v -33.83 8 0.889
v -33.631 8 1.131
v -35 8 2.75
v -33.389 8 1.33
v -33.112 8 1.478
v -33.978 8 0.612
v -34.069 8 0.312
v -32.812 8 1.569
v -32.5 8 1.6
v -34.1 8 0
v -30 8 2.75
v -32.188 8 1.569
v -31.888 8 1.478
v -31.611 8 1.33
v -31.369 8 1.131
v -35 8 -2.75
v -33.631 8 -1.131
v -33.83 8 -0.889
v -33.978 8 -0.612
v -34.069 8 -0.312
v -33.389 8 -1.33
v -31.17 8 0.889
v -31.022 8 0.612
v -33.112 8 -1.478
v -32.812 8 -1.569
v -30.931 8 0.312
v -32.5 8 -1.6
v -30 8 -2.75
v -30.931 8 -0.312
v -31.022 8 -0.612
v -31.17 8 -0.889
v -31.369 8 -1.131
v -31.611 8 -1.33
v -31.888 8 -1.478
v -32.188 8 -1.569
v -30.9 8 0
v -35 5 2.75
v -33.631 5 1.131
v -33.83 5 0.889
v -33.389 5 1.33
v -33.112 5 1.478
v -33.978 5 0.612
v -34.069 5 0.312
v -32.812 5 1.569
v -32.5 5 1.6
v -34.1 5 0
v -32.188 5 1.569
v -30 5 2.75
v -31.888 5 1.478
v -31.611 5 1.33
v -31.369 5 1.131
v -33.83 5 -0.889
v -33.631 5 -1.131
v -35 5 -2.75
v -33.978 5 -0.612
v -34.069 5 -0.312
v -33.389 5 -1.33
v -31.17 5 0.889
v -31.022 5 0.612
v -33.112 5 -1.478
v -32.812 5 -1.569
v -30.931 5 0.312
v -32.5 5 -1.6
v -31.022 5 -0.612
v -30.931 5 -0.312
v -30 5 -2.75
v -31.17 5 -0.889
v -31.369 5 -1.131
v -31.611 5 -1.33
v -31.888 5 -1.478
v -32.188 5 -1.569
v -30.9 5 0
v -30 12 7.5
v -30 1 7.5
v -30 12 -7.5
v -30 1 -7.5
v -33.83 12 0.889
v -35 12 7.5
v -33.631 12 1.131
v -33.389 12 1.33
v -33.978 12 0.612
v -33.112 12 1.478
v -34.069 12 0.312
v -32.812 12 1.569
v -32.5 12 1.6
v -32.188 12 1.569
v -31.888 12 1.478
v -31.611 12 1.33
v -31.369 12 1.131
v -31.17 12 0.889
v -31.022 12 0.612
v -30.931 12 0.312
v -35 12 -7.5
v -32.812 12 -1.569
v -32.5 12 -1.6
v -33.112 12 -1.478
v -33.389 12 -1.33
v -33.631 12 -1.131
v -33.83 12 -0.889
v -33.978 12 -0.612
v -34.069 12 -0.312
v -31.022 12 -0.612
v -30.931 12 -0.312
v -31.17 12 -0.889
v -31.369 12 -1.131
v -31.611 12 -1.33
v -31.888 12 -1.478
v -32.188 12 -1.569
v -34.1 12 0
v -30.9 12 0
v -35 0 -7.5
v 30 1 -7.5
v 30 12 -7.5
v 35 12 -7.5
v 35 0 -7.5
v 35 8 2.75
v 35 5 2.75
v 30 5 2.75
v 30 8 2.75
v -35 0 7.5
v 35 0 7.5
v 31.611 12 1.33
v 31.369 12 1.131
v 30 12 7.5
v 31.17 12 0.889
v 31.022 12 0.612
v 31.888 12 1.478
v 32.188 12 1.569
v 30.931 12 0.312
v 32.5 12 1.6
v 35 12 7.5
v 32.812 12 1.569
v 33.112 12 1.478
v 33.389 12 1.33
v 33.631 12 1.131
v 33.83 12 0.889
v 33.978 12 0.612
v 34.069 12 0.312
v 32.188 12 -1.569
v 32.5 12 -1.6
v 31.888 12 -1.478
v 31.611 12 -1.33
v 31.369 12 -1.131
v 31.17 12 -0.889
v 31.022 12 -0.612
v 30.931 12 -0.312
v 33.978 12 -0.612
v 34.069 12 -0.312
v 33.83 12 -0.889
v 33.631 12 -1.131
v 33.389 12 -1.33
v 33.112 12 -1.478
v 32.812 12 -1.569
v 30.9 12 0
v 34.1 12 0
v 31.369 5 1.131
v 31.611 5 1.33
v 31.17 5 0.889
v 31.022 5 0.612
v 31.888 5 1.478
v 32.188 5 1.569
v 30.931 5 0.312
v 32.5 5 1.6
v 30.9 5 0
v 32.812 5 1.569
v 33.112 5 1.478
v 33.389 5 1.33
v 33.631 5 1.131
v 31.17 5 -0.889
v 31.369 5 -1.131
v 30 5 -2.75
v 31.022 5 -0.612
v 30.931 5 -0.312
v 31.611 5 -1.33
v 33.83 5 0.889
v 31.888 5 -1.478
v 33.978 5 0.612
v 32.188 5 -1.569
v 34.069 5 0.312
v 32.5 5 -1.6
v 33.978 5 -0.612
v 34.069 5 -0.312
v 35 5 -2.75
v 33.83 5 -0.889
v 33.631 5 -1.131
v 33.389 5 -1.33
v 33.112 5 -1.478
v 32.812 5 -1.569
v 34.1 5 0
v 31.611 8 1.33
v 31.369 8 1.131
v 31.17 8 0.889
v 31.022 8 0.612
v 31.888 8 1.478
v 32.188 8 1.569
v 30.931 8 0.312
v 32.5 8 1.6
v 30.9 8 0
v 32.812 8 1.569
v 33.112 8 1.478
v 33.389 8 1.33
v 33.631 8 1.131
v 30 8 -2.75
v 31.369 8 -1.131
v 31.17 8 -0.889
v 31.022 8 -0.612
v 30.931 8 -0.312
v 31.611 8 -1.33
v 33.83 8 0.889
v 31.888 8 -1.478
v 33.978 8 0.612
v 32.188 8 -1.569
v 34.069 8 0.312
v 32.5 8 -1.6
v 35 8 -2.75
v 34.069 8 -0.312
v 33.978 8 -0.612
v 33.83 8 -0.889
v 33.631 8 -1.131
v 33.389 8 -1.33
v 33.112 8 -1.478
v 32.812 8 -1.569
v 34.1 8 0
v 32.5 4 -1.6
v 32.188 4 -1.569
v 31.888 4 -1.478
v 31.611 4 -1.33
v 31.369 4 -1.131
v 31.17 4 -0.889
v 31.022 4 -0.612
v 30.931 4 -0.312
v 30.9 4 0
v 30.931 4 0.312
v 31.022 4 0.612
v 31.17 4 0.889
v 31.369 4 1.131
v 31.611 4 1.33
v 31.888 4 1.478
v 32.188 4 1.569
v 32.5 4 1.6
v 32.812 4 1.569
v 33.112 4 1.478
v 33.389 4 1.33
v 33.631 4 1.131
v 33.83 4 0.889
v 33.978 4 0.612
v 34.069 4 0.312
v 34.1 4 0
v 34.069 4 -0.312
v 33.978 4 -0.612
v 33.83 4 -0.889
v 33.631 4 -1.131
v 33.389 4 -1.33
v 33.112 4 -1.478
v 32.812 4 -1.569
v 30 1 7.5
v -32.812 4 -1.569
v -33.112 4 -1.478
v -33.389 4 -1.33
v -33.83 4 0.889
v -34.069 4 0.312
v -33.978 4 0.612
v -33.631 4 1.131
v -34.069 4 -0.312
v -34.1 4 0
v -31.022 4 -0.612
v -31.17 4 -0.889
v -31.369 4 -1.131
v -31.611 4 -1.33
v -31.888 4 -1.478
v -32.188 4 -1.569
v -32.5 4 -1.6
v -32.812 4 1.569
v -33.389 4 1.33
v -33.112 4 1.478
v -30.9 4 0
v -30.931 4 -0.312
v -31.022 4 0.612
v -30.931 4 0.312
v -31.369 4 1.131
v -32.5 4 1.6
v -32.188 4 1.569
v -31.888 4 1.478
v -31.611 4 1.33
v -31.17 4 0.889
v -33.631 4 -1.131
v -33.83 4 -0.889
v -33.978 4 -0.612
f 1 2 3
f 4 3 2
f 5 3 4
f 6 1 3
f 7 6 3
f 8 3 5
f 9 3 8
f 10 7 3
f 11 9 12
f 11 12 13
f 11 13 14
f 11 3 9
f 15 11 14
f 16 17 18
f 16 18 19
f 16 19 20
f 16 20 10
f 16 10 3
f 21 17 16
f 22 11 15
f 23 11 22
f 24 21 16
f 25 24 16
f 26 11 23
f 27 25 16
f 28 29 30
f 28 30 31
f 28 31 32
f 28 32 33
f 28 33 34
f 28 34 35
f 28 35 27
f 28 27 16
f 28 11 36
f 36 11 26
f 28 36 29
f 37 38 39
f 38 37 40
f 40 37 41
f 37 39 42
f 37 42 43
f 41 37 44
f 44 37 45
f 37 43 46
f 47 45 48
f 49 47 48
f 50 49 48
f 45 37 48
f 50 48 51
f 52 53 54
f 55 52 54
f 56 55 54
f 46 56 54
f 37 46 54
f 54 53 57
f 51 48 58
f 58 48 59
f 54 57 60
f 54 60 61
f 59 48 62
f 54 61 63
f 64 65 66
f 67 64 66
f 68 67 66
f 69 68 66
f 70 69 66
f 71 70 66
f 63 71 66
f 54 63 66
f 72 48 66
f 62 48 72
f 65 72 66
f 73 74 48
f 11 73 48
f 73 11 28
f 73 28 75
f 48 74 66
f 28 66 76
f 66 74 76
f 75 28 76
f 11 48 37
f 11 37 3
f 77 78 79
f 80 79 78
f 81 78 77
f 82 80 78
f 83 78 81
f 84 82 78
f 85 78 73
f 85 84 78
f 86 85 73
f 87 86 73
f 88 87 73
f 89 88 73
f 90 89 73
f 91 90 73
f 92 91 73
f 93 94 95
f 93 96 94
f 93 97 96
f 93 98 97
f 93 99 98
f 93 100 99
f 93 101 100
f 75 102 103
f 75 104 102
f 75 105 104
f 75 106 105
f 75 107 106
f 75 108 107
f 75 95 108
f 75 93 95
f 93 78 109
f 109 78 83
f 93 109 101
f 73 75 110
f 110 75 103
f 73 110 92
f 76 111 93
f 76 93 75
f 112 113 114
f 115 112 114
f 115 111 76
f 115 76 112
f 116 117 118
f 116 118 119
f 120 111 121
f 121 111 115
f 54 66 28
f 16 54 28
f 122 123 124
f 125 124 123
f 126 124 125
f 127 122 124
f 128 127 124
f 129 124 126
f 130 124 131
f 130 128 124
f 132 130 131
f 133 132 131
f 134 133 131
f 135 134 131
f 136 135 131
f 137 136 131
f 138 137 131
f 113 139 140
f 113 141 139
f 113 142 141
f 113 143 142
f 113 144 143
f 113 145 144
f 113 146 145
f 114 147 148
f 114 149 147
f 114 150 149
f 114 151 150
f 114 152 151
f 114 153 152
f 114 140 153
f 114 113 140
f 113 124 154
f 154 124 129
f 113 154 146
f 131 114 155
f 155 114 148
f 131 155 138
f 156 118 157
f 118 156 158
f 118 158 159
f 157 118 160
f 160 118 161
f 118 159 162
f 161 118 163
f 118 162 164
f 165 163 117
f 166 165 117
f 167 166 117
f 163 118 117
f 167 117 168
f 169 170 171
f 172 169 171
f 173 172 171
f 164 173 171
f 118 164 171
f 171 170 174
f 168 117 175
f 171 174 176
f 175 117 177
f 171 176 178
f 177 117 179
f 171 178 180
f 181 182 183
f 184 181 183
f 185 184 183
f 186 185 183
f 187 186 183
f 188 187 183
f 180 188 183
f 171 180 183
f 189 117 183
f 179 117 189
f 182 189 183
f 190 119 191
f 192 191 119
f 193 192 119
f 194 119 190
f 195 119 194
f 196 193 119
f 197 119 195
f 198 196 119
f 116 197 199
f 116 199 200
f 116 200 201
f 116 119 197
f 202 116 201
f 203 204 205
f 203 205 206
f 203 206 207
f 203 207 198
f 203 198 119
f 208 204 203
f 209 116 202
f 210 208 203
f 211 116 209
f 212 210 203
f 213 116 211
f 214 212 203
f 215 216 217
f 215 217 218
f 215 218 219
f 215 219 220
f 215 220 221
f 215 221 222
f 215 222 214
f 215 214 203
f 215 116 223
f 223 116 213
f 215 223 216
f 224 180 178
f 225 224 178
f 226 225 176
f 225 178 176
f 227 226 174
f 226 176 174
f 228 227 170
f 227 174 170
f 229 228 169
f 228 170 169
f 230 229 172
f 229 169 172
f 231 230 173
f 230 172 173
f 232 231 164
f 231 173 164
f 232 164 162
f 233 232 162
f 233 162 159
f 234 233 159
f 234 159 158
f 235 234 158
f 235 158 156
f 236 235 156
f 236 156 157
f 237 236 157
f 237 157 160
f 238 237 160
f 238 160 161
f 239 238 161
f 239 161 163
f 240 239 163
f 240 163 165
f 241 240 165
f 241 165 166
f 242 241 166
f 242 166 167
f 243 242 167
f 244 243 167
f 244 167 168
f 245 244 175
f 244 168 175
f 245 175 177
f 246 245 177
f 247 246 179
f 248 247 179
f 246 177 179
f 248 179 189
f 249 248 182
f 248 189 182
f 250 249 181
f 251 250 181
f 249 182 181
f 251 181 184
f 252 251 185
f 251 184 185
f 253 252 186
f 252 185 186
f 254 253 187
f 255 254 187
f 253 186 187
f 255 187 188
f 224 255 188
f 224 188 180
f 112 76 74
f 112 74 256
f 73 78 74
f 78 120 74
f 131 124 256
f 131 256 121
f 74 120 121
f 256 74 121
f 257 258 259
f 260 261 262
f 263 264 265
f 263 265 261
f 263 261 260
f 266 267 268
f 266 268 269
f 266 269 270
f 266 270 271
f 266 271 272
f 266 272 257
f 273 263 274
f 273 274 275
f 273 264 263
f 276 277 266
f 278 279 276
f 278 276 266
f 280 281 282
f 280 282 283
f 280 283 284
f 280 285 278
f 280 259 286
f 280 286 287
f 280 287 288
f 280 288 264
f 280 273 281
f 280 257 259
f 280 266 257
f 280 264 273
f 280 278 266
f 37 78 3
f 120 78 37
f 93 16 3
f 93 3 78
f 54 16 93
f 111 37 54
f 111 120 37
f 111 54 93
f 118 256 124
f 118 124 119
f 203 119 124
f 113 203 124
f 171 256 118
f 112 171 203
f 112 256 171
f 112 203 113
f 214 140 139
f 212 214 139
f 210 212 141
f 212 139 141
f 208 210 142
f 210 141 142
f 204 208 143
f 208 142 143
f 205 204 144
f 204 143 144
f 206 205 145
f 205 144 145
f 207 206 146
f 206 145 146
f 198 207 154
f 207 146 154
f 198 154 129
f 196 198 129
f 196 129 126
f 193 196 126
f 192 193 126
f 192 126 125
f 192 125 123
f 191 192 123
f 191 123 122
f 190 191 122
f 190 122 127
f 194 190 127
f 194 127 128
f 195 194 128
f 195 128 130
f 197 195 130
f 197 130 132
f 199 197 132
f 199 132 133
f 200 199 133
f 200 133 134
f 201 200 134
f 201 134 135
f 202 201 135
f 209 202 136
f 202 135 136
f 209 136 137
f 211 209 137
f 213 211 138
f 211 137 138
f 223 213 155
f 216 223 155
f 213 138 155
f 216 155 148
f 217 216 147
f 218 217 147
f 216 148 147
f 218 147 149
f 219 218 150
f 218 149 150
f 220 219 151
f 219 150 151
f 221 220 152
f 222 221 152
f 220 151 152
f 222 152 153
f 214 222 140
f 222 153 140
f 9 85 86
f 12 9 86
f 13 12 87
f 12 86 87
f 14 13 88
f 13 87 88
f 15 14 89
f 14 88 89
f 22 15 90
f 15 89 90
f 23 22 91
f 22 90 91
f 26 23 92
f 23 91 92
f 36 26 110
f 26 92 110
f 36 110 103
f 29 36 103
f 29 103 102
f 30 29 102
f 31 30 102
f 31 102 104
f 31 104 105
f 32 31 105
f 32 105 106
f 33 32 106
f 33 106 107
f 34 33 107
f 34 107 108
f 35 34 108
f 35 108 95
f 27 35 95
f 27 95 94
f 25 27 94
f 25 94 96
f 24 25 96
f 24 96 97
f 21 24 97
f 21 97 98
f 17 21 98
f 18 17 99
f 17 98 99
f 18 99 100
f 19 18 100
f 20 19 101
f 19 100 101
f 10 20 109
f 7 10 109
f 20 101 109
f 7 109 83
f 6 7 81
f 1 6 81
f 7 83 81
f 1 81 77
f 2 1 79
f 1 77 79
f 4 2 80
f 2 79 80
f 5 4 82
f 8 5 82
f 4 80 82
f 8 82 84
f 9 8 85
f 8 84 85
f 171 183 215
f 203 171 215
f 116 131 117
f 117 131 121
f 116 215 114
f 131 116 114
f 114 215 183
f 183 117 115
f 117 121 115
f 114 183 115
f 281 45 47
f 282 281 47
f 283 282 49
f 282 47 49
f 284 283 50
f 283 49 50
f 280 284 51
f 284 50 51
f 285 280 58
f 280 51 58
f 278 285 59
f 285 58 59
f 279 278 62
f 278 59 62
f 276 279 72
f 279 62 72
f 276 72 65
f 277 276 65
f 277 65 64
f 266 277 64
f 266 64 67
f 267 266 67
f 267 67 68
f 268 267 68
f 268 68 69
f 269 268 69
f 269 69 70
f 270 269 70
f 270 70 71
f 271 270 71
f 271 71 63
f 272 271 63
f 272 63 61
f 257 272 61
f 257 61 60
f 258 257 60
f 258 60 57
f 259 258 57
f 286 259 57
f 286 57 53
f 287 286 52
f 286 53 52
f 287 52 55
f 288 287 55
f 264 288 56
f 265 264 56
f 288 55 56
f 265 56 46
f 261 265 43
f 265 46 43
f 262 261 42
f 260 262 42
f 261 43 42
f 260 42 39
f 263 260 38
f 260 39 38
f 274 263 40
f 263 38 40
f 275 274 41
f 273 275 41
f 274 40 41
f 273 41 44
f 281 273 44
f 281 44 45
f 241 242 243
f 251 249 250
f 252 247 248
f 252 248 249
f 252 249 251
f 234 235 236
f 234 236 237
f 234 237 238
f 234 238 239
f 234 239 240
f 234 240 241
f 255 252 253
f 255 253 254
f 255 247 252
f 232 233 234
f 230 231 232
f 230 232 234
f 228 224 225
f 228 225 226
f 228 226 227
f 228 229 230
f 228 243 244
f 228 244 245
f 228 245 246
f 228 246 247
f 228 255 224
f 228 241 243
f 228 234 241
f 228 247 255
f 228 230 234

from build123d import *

# Parameters (mm, degrees)
SKETCH1_W           = 70
SKETCH1_H           = 15
BOSS_EXTRUDE1_DEPTH = 1
SKETCH2_W           = 5
SKETCH2_H           = 15
BOSS_EXTRUDE2_DEPTH = 11
SKETCH3_R           = 1.6
CUT_EXTRUDE1_DEPTH  = 8
SKETCH4_W           = 5.5
SKETCH4_H           = 3
CUT_EXTRUDE2_DEPTH  = 72.416034614


with BuildPart() as part:
    # Sketch1 → Boss-Extrude1 (new body)
    with BuildSketch(Plane(origin=(0, 0, 0), x_dir=(1, 0, 0), z_dir=(0, 1, 0))):
        Rectangle(SKETCH1_W, SKETCH1_H)
    extrude(amount=BOSS_EXTRUDE1_DEPTH)

    # Sketch2 → Boss-Extrude2 (add)
    with BuildSketch(Plane(origin=(0, 1, 0), x_dir=(1, 0, 0), z_dir=(0, 1, 0))):
        with Locations((-32.5, 0)):
            Rectangle(SKETCH2_W, SKETCH2_H)
        with Locations((32.5, 0)):
            Rectangle(SKETCH2_W, SKETCH2_H)
    extrude(amount=BOSS_EXTRUDE2_DEPTH)

    # Sketch3 → Cut-Extrude1 (cut)
    with BuildSketch(Plane(origin=(0, 12, 0), x_dir=(1, 0, 0), z_dir=(0, 1, 0))):
        with Locations(Location((-32.5, 0, 0), (0, 0, 270))):
            Circle(SKETCH3_R)
        with Locations(Location((32.5, 0, 0), (0, 0, 90))):
            Circle(SKETCH3_R)
    extrude(amount=-CUT_EXTRUDE1_DEPTH, mode=Mode.SUBTRACT)

    # Sketch4 → Cut-Extrude2 (cut, through all)
    with BuildSketch(Plane(origin=(35, 0, 0), x_dir=(0, 0, -1), z_dir=(1, 0, 0))):
        with Locations((0, 6.5)):
            Rectangle(SKETCH4_W, SKETCH4_H)
    extrude(amount=-CUT_EXTRUDE2_DEPTH, mode=Mode.SUBTRACT)


solid = part.part
